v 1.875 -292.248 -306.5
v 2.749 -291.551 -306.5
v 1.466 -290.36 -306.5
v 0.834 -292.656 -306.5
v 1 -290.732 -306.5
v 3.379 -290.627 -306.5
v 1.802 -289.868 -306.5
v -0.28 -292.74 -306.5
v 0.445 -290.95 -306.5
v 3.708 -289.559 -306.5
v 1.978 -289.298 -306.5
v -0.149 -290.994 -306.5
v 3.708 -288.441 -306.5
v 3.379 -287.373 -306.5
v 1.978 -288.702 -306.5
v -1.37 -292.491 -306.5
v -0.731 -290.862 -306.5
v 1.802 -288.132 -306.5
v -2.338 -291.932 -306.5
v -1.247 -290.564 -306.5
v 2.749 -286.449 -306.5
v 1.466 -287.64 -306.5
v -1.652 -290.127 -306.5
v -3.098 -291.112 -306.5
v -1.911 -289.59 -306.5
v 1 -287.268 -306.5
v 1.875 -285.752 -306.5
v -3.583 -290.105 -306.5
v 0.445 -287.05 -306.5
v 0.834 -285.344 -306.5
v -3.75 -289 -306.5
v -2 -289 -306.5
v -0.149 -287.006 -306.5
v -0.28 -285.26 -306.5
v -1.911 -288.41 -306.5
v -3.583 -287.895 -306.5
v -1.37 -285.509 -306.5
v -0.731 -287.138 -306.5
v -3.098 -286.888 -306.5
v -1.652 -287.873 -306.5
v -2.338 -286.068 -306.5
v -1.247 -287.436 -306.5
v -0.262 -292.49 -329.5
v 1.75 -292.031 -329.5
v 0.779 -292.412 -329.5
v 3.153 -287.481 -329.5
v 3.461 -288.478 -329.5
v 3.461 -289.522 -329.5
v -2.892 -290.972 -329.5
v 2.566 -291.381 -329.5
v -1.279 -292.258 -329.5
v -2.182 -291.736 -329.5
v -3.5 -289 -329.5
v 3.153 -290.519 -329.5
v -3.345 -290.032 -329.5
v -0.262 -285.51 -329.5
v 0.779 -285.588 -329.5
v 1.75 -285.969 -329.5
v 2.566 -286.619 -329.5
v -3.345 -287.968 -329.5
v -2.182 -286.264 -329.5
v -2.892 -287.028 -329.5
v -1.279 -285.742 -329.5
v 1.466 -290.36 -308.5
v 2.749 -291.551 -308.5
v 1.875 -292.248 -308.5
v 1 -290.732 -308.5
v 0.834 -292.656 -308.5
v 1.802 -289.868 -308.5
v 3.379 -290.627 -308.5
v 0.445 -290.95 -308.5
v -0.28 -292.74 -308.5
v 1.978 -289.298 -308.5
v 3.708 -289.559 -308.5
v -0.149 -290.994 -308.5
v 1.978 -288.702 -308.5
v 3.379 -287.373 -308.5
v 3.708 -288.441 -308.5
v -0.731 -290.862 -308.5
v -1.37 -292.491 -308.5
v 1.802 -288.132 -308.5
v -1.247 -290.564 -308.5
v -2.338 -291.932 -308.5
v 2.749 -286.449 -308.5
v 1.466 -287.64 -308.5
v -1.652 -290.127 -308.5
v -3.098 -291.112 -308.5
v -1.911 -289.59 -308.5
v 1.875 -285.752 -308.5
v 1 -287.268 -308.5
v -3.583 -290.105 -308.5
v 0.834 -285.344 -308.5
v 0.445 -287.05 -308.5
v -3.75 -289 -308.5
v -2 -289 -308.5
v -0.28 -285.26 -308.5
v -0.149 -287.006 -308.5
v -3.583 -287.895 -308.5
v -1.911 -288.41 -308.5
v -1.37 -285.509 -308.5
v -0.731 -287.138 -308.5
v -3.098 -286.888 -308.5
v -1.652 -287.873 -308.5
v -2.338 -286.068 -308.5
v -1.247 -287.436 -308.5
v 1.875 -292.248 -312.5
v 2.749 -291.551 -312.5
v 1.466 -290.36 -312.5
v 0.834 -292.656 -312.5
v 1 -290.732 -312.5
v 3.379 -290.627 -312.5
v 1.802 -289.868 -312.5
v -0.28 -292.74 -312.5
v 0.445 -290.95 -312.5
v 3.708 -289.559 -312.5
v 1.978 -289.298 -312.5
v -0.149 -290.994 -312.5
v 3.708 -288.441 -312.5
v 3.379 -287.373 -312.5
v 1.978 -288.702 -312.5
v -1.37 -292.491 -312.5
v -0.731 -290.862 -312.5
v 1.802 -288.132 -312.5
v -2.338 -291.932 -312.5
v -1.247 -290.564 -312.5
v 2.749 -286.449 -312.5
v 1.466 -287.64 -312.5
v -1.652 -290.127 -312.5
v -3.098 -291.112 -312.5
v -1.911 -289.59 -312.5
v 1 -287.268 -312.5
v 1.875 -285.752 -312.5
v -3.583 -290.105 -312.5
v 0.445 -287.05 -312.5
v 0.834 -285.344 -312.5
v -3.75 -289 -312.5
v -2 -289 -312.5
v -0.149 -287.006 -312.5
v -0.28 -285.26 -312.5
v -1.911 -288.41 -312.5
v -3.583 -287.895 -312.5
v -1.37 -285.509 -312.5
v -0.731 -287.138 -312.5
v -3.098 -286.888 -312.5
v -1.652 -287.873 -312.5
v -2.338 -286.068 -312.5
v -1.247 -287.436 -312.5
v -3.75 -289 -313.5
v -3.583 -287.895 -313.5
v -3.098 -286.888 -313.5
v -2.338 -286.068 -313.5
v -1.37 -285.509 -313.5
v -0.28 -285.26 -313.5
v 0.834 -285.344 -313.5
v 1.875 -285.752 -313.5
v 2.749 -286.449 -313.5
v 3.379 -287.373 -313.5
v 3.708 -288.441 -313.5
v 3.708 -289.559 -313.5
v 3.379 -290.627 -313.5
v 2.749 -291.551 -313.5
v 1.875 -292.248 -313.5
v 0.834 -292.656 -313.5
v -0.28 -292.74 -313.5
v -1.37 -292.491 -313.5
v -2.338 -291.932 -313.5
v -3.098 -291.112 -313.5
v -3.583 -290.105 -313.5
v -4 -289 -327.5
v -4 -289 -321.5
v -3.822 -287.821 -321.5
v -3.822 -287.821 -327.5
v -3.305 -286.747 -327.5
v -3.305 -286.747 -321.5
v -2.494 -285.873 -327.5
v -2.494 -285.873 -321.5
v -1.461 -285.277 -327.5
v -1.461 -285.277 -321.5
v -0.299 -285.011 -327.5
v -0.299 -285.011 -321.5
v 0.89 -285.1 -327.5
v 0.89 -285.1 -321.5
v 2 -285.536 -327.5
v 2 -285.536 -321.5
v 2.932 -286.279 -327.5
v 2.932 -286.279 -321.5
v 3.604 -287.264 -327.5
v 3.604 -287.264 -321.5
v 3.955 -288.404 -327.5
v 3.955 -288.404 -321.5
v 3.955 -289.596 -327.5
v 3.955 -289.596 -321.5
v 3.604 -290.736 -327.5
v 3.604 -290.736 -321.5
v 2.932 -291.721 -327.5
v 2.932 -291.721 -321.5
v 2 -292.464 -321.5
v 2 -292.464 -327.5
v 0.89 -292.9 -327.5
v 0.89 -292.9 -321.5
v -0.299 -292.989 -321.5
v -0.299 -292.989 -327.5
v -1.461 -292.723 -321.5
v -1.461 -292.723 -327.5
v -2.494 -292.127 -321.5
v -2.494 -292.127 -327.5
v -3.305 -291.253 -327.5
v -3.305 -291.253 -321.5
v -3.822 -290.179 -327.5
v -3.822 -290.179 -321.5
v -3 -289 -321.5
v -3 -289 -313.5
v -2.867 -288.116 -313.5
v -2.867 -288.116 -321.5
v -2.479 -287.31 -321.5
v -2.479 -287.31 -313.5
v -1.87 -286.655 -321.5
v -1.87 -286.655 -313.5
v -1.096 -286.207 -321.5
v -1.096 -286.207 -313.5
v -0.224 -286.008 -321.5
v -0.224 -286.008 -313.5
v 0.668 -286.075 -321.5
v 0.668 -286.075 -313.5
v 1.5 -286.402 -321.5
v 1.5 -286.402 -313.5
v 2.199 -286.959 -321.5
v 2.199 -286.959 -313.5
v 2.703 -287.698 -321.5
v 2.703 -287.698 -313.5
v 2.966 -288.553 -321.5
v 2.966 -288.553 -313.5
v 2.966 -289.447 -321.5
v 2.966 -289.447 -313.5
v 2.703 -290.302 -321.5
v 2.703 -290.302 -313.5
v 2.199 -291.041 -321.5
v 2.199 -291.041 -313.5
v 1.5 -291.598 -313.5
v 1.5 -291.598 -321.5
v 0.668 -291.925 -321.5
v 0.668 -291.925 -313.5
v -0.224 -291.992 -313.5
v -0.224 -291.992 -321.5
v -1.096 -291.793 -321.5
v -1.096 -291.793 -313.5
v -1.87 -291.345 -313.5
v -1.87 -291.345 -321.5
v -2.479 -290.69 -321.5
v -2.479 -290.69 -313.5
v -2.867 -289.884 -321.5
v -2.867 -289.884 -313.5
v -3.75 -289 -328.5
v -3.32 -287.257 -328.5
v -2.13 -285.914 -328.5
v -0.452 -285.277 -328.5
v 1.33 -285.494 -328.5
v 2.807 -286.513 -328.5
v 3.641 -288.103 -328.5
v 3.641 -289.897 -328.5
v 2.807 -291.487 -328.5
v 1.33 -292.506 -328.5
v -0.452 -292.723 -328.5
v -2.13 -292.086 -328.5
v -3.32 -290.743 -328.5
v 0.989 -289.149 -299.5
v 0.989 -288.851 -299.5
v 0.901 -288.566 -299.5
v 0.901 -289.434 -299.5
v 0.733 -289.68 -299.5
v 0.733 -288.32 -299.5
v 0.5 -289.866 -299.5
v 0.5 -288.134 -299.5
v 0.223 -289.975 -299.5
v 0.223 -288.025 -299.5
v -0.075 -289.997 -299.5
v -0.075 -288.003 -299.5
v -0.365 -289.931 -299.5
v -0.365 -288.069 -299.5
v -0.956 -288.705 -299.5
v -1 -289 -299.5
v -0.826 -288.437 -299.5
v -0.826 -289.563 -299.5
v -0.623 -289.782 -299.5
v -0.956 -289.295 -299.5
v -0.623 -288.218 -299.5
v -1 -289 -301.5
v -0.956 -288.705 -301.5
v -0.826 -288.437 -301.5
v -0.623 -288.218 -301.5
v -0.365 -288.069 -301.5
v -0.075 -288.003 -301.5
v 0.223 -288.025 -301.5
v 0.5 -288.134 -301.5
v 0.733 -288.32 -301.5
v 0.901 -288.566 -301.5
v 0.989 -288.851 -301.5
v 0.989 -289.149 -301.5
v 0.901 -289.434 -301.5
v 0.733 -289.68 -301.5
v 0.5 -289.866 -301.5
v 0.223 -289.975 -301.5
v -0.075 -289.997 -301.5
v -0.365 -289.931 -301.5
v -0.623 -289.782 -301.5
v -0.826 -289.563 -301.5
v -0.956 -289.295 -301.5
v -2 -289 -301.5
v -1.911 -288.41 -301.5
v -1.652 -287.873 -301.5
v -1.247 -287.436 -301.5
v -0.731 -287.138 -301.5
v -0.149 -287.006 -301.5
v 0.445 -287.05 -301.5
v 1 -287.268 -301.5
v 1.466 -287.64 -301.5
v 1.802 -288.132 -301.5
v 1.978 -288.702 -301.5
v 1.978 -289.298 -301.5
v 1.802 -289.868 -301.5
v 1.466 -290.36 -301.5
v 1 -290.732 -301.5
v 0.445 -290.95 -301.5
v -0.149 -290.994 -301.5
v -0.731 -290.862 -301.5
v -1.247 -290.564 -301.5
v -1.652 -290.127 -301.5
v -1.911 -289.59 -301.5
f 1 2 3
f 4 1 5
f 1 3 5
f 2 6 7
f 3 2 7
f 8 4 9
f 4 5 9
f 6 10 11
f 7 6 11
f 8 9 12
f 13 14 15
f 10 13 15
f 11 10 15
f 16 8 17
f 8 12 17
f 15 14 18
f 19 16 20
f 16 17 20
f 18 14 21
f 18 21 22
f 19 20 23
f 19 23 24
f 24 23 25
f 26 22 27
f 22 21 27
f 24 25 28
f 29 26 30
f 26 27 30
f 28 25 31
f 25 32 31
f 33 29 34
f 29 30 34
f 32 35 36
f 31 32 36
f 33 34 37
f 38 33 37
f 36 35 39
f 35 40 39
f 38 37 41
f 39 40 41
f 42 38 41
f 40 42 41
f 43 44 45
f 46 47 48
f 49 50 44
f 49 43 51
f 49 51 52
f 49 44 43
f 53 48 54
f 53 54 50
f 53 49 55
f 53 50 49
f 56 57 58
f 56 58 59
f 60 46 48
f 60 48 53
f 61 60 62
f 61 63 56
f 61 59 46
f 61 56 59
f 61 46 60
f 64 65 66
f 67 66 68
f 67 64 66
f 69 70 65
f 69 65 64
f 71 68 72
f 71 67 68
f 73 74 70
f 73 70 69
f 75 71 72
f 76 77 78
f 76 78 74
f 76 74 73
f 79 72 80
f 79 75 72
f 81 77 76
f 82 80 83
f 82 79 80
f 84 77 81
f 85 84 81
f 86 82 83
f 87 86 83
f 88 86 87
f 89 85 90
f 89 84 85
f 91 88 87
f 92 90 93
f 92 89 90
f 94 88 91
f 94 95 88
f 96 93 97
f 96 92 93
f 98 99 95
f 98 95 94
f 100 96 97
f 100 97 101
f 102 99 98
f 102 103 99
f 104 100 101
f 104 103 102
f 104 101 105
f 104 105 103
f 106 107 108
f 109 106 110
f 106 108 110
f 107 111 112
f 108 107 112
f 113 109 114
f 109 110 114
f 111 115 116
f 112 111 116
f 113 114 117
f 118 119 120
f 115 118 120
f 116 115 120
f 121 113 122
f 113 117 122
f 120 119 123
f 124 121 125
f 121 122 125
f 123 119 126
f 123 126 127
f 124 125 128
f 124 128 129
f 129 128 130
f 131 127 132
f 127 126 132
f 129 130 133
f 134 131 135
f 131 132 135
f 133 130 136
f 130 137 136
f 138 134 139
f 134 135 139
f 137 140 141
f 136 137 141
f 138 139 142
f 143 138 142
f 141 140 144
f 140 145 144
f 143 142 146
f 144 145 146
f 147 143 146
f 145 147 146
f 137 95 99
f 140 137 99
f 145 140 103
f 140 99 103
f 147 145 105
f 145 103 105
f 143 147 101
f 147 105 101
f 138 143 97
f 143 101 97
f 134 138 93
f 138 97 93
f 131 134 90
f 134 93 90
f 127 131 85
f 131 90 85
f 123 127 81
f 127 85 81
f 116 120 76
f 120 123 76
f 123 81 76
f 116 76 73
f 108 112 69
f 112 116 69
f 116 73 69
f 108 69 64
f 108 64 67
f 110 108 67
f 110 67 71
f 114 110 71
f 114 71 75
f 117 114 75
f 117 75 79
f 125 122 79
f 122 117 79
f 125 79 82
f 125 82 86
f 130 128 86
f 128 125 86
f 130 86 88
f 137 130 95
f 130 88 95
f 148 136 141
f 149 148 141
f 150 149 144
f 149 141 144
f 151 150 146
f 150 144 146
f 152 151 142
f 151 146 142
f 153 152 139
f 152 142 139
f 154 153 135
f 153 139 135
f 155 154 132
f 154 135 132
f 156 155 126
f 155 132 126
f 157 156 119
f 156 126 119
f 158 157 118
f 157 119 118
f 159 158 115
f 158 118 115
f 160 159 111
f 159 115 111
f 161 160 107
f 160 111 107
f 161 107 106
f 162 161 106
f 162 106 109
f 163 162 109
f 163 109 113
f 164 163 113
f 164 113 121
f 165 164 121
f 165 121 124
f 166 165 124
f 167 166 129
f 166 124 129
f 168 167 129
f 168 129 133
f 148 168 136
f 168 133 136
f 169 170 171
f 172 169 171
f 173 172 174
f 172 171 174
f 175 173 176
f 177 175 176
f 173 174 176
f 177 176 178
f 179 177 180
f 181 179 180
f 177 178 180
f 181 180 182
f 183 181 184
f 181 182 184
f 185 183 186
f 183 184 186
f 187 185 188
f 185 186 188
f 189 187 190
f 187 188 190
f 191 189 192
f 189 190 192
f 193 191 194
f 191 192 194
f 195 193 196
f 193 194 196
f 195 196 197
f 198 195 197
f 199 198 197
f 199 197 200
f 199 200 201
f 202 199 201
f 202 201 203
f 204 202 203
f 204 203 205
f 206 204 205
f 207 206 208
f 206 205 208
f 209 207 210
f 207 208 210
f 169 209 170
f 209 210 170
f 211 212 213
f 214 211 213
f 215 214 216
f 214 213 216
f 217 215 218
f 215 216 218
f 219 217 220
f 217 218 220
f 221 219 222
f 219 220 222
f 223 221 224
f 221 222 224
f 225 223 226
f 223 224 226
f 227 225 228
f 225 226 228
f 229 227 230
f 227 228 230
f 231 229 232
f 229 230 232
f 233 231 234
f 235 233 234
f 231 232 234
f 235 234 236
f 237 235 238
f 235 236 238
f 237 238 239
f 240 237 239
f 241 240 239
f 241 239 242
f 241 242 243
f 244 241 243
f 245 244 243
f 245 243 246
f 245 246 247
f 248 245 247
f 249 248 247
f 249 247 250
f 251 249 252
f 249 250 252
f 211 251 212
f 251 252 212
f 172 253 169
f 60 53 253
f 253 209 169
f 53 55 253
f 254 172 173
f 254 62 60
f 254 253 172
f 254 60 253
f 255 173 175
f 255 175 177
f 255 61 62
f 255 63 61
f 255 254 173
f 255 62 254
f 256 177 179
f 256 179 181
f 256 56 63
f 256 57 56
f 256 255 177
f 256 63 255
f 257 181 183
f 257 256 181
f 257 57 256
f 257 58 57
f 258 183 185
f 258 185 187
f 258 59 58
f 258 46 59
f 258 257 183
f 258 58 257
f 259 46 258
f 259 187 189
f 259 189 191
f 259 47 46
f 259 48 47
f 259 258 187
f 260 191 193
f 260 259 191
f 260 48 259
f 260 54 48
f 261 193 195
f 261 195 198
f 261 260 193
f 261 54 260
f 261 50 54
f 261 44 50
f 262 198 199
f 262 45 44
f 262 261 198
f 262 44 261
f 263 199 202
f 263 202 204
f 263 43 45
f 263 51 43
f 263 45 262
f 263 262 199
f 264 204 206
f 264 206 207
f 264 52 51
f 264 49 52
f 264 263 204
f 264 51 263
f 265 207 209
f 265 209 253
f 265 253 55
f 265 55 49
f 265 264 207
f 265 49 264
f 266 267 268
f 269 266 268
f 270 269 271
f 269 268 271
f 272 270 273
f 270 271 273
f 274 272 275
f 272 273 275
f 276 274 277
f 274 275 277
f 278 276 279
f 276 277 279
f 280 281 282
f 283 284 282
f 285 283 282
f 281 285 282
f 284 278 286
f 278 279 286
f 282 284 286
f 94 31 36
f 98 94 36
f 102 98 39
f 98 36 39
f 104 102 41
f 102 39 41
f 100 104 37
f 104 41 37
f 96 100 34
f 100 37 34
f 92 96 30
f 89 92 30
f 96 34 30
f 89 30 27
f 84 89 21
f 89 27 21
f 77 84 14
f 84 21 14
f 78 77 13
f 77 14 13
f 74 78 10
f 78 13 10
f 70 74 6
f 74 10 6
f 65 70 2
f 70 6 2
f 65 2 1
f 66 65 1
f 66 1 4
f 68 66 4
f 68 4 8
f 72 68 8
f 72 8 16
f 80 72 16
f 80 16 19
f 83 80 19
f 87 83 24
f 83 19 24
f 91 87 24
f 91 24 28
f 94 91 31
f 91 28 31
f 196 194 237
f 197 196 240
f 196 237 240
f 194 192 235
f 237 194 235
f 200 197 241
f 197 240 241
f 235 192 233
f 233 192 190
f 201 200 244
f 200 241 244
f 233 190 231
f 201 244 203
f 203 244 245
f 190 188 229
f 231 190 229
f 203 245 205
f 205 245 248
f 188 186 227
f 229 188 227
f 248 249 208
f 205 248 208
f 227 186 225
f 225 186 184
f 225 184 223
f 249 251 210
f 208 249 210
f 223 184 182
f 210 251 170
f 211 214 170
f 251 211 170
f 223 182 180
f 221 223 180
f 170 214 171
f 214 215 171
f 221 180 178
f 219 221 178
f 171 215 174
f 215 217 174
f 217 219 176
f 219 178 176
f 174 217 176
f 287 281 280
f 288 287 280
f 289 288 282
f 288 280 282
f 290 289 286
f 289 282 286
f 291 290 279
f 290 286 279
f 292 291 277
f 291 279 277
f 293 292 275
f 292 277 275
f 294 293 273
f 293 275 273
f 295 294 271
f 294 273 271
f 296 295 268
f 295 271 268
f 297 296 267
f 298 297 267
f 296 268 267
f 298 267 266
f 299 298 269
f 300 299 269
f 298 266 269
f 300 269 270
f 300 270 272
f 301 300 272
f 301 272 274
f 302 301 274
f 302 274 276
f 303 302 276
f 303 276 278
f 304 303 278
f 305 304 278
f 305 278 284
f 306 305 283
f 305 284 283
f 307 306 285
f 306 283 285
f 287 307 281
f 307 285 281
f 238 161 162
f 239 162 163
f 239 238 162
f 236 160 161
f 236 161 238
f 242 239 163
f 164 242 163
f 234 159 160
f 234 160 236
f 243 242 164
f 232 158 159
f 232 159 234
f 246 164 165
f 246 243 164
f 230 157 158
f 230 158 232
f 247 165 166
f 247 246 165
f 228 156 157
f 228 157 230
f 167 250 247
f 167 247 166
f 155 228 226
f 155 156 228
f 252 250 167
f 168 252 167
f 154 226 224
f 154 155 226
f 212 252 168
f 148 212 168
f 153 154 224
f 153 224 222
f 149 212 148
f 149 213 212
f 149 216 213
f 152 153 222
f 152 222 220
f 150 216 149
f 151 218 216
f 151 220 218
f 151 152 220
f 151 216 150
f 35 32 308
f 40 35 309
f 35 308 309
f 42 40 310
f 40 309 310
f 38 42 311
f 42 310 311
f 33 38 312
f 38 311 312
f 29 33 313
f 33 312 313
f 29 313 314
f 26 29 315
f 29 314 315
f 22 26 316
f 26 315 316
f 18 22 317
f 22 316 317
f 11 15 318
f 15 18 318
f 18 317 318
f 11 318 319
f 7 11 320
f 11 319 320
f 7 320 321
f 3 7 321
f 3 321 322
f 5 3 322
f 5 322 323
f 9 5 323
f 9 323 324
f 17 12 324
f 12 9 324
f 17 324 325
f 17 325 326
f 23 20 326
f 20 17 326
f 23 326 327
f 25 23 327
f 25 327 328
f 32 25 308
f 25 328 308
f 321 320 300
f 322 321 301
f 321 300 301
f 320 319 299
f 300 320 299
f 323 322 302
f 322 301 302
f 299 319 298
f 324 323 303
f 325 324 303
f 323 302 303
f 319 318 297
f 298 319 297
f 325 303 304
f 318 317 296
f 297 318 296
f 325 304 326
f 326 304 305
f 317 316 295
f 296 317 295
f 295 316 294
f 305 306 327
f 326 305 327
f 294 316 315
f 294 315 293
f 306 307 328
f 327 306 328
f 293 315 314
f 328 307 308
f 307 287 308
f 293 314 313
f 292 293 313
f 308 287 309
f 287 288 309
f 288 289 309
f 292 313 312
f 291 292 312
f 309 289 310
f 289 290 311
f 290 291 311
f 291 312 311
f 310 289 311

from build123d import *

# Parameters (mm, degrees)
CYLINDER082_R             = 2
CYLINDER082_DEPTH         = 28
CYLINDER083_R             = 3.75
CYLINDER083_DEPTH         = 2
CYLINDER084_R             = 3.75
CYLINDER084_DEPTH         = 1
CYLINDER085_R             = 3
CYLINDER085_DEPTH         = 8
CYLINDER086_R             = 4
CYLINDER086_DEPTH         = 6
CYLINDER087_R             = 1
CYLINDER087_DEPTH         = 2
FUSION026_PLACEMENT_ANGLE = 180


with BuildPart() as cylinder082:
    # Cylinder082 → Cylinder082 (new body)
    with BuildSketch(Plane.XY):
        Circle(CYLINDER082_R)
    extrude(amount=CYLINDER082_DEPTH)


with BuildPart() as cylinder083:
    # Cylinder083 → Cylinder083 (new body)
    with BuildSketch(Plane.XY.offset(5)):
        Circle(CYLINDER083_R)
    extrude(amount=CYLINDER083_DEPTH)


with BuildPart() as cylinder084:
    # Cylinder084 → Cylinder084 (new body)
    with BuildSketch(Plane.XY.offset(11)):
        Circle(CYLINDER084_R)
    extrude(amount=CYLINDER084_DEPTH)


with BuildPart() as cylinder085:
    # Cylinder085 → Cylinder085 (new body)
    with BuildSketch(Plane.XY.offset(12)):
        Circle(CYLINDER085_R)
    extrude(amount=CYLINDER085_DEPTH)


with BuildPart() as cylinder086:
    # Cylinder086 → Cylinder086 (new body)
    with BuildSketch(Plane.XY.offset(20)):
        Circle(CYLINDER086_R)
    extrude(amount=CYLINDER086_DEPTH)


with BuildPart() as fusion025:
    # Cone001 → Cone001 (revolve)
    with BuildSketch(Plane(origin=(0, 0, 26), x_dir=(1, 0, 0), z_dir=(0, -1, 0))):
        Polygon((0, 0), (4, 0), (3.5, 2), (0, 2), align=None)
    revolve(axis=Axis((0, 0, 26), (0, 0, 1)))

    # Fusion025: union Cylinder082, Cylinder083, Cylinder084, Cylinder085, Cylinder086
    add(cylinder082.part)
    add(cylinder083.part)
    add(cylinder084.part)
    add(cylinder085.part)
    add(cylinder086.part)


with BuildPart() as miccut:
    # Cylinder087 → Cylinder087 (new body)
    with BuildSketch(Plane.XY.offset(-2)):
        Circle(CYLINDER087_R)
    extrude(amount=CYLINDER087_DEPTH)

    # Fusion026: union Fusion025
    add(fusion025.part)


with BuildPart() as miccut_1:
    # Fusion026 placement: moved
    add(miccut.part.moved(Location((0, -289, -301.5))).rotate(Axis((0, -289, -301.5), (0, -1, 0)), FUSION026_PLACEMENT_ANGLE))


solid = miccut_1.part
